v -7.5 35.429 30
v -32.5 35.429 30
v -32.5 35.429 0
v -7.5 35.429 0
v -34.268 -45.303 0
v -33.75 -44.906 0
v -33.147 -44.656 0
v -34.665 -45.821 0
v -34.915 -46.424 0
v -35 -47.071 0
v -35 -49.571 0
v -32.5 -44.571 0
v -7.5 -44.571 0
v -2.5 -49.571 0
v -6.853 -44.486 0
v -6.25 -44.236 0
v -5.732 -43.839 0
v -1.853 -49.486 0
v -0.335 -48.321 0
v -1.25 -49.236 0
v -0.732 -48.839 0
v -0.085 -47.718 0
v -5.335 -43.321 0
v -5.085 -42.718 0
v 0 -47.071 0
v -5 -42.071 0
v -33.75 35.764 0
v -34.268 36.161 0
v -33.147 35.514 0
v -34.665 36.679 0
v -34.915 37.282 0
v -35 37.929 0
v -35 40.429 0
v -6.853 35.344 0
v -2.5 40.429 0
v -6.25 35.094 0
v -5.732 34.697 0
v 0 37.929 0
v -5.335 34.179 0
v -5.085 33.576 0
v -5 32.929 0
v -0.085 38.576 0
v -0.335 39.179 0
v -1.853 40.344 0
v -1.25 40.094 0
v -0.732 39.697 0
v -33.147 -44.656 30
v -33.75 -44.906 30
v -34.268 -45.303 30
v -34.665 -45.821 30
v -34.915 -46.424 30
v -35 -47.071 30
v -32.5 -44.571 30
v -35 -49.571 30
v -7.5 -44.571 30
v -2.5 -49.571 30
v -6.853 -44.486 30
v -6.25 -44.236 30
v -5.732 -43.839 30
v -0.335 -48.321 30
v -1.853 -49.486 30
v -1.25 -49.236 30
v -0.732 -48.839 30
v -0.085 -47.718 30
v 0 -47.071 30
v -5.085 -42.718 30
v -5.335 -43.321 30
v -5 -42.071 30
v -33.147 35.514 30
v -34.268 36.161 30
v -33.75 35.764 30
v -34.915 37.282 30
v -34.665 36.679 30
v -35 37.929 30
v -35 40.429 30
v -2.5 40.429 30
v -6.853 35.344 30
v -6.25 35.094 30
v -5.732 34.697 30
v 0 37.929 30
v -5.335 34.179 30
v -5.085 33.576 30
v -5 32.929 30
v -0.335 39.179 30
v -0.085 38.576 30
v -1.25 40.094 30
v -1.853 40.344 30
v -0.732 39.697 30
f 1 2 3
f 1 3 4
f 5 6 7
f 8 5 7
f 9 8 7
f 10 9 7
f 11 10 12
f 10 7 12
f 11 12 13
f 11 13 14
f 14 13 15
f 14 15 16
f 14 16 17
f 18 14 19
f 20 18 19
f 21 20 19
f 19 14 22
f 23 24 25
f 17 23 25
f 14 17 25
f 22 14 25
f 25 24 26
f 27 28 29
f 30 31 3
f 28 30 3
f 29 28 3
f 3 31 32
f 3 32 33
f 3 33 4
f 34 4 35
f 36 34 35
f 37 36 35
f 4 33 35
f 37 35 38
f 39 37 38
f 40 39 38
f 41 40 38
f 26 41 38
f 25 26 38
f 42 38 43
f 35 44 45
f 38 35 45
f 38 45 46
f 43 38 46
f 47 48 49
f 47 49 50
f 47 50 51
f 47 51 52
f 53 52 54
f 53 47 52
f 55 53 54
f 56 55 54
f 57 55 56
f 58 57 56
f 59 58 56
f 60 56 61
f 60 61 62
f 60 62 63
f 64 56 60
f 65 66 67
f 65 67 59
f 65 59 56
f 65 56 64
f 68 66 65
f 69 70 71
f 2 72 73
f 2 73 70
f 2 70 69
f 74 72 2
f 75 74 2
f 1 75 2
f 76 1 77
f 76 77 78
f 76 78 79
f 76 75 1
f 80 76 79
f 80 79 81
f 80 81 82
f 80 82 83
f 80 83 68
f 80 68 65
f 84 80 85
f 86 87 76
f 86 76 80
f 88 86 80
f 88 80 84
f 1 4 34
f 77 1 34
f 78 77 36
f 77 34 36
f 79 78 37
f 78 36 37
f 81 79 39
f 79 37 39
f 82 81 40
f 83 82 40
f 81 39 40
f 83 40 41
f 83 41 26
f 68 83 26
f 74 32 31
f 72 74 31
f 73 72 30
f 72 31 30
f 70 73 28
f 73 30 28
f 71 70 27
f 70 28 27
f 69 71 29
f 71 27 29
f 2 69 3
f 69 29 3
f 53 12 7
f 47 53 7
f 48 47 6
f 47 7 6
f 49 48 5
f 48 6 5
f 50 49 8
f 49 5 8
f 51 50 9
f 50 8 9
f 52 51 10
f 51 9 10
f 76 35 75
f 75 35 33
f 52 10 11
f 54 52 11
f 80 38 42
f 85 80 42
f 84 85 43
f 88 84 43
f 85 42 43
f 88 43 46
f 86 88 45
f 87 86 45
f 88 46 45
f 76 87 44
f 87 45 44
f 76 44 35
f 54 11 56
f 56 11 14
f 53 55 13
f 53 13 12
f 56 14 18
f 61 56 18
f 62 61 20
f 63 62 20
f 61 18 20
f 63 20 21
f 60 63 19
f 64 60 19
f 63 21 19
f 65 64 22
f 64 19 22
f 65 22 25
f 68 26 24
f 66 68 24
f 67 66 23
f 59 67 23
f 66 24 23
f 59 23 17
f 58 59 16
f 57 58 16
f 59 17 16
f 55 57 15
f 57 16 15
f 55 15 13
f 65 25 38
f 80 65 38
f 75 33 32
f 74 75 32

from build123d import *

# Parameters (mm, degrees)
F1_DEPTH = 30


with BuildPart() as f1:
    # F0 (on Top) → F1 (new body)
    with BuildSketch(Plane.XY):
        with BuildLine():
            Line((0, -47.071106), (0, 37.928894))
            ThreePointArc((0, 37.928894), (-0.732233, 39.696661), (-2.5, 40.428894))
            Line((-2.5, 40.428894), (-35, 40.428894))
            Line((-35, 40.428894), (-35, 37.928894))
            ThreePointArc((-35, 37.928894), (-34.267767, 36.161127), (-32.5, 35.428894))
            Line((-32.5, 35.428894), (-7.5, 35.428894))
            ThreePointArc((-7.5, 35.428894), (-5.732233, 34.696661), (-5, 32.928894))
            Line((-5, 32.928894), (-5, -42.071106))
            ThreePointArc((-5, -42.071106), (-5.732233, -43.838873), (-7.5, -44.571106))
            Line((-7.5, -44.571106), (-32.5, -44.571106))
            ThreePointArc((-32.5, -44.571106), (-34.267767, -45.303339), (-35, -47.071106))
            Line((-35, -47.071106), (-35, -49.571106))
            Line((-35, -49.571106), (-2.5, -49.571106))
            ThreePointArc((-2.5, -49.571106), (-0.732233, -48.838873), (0, -47.071106))
        make_face()
    extrude(amount=F1_DEPTH)


solid = f1.part
